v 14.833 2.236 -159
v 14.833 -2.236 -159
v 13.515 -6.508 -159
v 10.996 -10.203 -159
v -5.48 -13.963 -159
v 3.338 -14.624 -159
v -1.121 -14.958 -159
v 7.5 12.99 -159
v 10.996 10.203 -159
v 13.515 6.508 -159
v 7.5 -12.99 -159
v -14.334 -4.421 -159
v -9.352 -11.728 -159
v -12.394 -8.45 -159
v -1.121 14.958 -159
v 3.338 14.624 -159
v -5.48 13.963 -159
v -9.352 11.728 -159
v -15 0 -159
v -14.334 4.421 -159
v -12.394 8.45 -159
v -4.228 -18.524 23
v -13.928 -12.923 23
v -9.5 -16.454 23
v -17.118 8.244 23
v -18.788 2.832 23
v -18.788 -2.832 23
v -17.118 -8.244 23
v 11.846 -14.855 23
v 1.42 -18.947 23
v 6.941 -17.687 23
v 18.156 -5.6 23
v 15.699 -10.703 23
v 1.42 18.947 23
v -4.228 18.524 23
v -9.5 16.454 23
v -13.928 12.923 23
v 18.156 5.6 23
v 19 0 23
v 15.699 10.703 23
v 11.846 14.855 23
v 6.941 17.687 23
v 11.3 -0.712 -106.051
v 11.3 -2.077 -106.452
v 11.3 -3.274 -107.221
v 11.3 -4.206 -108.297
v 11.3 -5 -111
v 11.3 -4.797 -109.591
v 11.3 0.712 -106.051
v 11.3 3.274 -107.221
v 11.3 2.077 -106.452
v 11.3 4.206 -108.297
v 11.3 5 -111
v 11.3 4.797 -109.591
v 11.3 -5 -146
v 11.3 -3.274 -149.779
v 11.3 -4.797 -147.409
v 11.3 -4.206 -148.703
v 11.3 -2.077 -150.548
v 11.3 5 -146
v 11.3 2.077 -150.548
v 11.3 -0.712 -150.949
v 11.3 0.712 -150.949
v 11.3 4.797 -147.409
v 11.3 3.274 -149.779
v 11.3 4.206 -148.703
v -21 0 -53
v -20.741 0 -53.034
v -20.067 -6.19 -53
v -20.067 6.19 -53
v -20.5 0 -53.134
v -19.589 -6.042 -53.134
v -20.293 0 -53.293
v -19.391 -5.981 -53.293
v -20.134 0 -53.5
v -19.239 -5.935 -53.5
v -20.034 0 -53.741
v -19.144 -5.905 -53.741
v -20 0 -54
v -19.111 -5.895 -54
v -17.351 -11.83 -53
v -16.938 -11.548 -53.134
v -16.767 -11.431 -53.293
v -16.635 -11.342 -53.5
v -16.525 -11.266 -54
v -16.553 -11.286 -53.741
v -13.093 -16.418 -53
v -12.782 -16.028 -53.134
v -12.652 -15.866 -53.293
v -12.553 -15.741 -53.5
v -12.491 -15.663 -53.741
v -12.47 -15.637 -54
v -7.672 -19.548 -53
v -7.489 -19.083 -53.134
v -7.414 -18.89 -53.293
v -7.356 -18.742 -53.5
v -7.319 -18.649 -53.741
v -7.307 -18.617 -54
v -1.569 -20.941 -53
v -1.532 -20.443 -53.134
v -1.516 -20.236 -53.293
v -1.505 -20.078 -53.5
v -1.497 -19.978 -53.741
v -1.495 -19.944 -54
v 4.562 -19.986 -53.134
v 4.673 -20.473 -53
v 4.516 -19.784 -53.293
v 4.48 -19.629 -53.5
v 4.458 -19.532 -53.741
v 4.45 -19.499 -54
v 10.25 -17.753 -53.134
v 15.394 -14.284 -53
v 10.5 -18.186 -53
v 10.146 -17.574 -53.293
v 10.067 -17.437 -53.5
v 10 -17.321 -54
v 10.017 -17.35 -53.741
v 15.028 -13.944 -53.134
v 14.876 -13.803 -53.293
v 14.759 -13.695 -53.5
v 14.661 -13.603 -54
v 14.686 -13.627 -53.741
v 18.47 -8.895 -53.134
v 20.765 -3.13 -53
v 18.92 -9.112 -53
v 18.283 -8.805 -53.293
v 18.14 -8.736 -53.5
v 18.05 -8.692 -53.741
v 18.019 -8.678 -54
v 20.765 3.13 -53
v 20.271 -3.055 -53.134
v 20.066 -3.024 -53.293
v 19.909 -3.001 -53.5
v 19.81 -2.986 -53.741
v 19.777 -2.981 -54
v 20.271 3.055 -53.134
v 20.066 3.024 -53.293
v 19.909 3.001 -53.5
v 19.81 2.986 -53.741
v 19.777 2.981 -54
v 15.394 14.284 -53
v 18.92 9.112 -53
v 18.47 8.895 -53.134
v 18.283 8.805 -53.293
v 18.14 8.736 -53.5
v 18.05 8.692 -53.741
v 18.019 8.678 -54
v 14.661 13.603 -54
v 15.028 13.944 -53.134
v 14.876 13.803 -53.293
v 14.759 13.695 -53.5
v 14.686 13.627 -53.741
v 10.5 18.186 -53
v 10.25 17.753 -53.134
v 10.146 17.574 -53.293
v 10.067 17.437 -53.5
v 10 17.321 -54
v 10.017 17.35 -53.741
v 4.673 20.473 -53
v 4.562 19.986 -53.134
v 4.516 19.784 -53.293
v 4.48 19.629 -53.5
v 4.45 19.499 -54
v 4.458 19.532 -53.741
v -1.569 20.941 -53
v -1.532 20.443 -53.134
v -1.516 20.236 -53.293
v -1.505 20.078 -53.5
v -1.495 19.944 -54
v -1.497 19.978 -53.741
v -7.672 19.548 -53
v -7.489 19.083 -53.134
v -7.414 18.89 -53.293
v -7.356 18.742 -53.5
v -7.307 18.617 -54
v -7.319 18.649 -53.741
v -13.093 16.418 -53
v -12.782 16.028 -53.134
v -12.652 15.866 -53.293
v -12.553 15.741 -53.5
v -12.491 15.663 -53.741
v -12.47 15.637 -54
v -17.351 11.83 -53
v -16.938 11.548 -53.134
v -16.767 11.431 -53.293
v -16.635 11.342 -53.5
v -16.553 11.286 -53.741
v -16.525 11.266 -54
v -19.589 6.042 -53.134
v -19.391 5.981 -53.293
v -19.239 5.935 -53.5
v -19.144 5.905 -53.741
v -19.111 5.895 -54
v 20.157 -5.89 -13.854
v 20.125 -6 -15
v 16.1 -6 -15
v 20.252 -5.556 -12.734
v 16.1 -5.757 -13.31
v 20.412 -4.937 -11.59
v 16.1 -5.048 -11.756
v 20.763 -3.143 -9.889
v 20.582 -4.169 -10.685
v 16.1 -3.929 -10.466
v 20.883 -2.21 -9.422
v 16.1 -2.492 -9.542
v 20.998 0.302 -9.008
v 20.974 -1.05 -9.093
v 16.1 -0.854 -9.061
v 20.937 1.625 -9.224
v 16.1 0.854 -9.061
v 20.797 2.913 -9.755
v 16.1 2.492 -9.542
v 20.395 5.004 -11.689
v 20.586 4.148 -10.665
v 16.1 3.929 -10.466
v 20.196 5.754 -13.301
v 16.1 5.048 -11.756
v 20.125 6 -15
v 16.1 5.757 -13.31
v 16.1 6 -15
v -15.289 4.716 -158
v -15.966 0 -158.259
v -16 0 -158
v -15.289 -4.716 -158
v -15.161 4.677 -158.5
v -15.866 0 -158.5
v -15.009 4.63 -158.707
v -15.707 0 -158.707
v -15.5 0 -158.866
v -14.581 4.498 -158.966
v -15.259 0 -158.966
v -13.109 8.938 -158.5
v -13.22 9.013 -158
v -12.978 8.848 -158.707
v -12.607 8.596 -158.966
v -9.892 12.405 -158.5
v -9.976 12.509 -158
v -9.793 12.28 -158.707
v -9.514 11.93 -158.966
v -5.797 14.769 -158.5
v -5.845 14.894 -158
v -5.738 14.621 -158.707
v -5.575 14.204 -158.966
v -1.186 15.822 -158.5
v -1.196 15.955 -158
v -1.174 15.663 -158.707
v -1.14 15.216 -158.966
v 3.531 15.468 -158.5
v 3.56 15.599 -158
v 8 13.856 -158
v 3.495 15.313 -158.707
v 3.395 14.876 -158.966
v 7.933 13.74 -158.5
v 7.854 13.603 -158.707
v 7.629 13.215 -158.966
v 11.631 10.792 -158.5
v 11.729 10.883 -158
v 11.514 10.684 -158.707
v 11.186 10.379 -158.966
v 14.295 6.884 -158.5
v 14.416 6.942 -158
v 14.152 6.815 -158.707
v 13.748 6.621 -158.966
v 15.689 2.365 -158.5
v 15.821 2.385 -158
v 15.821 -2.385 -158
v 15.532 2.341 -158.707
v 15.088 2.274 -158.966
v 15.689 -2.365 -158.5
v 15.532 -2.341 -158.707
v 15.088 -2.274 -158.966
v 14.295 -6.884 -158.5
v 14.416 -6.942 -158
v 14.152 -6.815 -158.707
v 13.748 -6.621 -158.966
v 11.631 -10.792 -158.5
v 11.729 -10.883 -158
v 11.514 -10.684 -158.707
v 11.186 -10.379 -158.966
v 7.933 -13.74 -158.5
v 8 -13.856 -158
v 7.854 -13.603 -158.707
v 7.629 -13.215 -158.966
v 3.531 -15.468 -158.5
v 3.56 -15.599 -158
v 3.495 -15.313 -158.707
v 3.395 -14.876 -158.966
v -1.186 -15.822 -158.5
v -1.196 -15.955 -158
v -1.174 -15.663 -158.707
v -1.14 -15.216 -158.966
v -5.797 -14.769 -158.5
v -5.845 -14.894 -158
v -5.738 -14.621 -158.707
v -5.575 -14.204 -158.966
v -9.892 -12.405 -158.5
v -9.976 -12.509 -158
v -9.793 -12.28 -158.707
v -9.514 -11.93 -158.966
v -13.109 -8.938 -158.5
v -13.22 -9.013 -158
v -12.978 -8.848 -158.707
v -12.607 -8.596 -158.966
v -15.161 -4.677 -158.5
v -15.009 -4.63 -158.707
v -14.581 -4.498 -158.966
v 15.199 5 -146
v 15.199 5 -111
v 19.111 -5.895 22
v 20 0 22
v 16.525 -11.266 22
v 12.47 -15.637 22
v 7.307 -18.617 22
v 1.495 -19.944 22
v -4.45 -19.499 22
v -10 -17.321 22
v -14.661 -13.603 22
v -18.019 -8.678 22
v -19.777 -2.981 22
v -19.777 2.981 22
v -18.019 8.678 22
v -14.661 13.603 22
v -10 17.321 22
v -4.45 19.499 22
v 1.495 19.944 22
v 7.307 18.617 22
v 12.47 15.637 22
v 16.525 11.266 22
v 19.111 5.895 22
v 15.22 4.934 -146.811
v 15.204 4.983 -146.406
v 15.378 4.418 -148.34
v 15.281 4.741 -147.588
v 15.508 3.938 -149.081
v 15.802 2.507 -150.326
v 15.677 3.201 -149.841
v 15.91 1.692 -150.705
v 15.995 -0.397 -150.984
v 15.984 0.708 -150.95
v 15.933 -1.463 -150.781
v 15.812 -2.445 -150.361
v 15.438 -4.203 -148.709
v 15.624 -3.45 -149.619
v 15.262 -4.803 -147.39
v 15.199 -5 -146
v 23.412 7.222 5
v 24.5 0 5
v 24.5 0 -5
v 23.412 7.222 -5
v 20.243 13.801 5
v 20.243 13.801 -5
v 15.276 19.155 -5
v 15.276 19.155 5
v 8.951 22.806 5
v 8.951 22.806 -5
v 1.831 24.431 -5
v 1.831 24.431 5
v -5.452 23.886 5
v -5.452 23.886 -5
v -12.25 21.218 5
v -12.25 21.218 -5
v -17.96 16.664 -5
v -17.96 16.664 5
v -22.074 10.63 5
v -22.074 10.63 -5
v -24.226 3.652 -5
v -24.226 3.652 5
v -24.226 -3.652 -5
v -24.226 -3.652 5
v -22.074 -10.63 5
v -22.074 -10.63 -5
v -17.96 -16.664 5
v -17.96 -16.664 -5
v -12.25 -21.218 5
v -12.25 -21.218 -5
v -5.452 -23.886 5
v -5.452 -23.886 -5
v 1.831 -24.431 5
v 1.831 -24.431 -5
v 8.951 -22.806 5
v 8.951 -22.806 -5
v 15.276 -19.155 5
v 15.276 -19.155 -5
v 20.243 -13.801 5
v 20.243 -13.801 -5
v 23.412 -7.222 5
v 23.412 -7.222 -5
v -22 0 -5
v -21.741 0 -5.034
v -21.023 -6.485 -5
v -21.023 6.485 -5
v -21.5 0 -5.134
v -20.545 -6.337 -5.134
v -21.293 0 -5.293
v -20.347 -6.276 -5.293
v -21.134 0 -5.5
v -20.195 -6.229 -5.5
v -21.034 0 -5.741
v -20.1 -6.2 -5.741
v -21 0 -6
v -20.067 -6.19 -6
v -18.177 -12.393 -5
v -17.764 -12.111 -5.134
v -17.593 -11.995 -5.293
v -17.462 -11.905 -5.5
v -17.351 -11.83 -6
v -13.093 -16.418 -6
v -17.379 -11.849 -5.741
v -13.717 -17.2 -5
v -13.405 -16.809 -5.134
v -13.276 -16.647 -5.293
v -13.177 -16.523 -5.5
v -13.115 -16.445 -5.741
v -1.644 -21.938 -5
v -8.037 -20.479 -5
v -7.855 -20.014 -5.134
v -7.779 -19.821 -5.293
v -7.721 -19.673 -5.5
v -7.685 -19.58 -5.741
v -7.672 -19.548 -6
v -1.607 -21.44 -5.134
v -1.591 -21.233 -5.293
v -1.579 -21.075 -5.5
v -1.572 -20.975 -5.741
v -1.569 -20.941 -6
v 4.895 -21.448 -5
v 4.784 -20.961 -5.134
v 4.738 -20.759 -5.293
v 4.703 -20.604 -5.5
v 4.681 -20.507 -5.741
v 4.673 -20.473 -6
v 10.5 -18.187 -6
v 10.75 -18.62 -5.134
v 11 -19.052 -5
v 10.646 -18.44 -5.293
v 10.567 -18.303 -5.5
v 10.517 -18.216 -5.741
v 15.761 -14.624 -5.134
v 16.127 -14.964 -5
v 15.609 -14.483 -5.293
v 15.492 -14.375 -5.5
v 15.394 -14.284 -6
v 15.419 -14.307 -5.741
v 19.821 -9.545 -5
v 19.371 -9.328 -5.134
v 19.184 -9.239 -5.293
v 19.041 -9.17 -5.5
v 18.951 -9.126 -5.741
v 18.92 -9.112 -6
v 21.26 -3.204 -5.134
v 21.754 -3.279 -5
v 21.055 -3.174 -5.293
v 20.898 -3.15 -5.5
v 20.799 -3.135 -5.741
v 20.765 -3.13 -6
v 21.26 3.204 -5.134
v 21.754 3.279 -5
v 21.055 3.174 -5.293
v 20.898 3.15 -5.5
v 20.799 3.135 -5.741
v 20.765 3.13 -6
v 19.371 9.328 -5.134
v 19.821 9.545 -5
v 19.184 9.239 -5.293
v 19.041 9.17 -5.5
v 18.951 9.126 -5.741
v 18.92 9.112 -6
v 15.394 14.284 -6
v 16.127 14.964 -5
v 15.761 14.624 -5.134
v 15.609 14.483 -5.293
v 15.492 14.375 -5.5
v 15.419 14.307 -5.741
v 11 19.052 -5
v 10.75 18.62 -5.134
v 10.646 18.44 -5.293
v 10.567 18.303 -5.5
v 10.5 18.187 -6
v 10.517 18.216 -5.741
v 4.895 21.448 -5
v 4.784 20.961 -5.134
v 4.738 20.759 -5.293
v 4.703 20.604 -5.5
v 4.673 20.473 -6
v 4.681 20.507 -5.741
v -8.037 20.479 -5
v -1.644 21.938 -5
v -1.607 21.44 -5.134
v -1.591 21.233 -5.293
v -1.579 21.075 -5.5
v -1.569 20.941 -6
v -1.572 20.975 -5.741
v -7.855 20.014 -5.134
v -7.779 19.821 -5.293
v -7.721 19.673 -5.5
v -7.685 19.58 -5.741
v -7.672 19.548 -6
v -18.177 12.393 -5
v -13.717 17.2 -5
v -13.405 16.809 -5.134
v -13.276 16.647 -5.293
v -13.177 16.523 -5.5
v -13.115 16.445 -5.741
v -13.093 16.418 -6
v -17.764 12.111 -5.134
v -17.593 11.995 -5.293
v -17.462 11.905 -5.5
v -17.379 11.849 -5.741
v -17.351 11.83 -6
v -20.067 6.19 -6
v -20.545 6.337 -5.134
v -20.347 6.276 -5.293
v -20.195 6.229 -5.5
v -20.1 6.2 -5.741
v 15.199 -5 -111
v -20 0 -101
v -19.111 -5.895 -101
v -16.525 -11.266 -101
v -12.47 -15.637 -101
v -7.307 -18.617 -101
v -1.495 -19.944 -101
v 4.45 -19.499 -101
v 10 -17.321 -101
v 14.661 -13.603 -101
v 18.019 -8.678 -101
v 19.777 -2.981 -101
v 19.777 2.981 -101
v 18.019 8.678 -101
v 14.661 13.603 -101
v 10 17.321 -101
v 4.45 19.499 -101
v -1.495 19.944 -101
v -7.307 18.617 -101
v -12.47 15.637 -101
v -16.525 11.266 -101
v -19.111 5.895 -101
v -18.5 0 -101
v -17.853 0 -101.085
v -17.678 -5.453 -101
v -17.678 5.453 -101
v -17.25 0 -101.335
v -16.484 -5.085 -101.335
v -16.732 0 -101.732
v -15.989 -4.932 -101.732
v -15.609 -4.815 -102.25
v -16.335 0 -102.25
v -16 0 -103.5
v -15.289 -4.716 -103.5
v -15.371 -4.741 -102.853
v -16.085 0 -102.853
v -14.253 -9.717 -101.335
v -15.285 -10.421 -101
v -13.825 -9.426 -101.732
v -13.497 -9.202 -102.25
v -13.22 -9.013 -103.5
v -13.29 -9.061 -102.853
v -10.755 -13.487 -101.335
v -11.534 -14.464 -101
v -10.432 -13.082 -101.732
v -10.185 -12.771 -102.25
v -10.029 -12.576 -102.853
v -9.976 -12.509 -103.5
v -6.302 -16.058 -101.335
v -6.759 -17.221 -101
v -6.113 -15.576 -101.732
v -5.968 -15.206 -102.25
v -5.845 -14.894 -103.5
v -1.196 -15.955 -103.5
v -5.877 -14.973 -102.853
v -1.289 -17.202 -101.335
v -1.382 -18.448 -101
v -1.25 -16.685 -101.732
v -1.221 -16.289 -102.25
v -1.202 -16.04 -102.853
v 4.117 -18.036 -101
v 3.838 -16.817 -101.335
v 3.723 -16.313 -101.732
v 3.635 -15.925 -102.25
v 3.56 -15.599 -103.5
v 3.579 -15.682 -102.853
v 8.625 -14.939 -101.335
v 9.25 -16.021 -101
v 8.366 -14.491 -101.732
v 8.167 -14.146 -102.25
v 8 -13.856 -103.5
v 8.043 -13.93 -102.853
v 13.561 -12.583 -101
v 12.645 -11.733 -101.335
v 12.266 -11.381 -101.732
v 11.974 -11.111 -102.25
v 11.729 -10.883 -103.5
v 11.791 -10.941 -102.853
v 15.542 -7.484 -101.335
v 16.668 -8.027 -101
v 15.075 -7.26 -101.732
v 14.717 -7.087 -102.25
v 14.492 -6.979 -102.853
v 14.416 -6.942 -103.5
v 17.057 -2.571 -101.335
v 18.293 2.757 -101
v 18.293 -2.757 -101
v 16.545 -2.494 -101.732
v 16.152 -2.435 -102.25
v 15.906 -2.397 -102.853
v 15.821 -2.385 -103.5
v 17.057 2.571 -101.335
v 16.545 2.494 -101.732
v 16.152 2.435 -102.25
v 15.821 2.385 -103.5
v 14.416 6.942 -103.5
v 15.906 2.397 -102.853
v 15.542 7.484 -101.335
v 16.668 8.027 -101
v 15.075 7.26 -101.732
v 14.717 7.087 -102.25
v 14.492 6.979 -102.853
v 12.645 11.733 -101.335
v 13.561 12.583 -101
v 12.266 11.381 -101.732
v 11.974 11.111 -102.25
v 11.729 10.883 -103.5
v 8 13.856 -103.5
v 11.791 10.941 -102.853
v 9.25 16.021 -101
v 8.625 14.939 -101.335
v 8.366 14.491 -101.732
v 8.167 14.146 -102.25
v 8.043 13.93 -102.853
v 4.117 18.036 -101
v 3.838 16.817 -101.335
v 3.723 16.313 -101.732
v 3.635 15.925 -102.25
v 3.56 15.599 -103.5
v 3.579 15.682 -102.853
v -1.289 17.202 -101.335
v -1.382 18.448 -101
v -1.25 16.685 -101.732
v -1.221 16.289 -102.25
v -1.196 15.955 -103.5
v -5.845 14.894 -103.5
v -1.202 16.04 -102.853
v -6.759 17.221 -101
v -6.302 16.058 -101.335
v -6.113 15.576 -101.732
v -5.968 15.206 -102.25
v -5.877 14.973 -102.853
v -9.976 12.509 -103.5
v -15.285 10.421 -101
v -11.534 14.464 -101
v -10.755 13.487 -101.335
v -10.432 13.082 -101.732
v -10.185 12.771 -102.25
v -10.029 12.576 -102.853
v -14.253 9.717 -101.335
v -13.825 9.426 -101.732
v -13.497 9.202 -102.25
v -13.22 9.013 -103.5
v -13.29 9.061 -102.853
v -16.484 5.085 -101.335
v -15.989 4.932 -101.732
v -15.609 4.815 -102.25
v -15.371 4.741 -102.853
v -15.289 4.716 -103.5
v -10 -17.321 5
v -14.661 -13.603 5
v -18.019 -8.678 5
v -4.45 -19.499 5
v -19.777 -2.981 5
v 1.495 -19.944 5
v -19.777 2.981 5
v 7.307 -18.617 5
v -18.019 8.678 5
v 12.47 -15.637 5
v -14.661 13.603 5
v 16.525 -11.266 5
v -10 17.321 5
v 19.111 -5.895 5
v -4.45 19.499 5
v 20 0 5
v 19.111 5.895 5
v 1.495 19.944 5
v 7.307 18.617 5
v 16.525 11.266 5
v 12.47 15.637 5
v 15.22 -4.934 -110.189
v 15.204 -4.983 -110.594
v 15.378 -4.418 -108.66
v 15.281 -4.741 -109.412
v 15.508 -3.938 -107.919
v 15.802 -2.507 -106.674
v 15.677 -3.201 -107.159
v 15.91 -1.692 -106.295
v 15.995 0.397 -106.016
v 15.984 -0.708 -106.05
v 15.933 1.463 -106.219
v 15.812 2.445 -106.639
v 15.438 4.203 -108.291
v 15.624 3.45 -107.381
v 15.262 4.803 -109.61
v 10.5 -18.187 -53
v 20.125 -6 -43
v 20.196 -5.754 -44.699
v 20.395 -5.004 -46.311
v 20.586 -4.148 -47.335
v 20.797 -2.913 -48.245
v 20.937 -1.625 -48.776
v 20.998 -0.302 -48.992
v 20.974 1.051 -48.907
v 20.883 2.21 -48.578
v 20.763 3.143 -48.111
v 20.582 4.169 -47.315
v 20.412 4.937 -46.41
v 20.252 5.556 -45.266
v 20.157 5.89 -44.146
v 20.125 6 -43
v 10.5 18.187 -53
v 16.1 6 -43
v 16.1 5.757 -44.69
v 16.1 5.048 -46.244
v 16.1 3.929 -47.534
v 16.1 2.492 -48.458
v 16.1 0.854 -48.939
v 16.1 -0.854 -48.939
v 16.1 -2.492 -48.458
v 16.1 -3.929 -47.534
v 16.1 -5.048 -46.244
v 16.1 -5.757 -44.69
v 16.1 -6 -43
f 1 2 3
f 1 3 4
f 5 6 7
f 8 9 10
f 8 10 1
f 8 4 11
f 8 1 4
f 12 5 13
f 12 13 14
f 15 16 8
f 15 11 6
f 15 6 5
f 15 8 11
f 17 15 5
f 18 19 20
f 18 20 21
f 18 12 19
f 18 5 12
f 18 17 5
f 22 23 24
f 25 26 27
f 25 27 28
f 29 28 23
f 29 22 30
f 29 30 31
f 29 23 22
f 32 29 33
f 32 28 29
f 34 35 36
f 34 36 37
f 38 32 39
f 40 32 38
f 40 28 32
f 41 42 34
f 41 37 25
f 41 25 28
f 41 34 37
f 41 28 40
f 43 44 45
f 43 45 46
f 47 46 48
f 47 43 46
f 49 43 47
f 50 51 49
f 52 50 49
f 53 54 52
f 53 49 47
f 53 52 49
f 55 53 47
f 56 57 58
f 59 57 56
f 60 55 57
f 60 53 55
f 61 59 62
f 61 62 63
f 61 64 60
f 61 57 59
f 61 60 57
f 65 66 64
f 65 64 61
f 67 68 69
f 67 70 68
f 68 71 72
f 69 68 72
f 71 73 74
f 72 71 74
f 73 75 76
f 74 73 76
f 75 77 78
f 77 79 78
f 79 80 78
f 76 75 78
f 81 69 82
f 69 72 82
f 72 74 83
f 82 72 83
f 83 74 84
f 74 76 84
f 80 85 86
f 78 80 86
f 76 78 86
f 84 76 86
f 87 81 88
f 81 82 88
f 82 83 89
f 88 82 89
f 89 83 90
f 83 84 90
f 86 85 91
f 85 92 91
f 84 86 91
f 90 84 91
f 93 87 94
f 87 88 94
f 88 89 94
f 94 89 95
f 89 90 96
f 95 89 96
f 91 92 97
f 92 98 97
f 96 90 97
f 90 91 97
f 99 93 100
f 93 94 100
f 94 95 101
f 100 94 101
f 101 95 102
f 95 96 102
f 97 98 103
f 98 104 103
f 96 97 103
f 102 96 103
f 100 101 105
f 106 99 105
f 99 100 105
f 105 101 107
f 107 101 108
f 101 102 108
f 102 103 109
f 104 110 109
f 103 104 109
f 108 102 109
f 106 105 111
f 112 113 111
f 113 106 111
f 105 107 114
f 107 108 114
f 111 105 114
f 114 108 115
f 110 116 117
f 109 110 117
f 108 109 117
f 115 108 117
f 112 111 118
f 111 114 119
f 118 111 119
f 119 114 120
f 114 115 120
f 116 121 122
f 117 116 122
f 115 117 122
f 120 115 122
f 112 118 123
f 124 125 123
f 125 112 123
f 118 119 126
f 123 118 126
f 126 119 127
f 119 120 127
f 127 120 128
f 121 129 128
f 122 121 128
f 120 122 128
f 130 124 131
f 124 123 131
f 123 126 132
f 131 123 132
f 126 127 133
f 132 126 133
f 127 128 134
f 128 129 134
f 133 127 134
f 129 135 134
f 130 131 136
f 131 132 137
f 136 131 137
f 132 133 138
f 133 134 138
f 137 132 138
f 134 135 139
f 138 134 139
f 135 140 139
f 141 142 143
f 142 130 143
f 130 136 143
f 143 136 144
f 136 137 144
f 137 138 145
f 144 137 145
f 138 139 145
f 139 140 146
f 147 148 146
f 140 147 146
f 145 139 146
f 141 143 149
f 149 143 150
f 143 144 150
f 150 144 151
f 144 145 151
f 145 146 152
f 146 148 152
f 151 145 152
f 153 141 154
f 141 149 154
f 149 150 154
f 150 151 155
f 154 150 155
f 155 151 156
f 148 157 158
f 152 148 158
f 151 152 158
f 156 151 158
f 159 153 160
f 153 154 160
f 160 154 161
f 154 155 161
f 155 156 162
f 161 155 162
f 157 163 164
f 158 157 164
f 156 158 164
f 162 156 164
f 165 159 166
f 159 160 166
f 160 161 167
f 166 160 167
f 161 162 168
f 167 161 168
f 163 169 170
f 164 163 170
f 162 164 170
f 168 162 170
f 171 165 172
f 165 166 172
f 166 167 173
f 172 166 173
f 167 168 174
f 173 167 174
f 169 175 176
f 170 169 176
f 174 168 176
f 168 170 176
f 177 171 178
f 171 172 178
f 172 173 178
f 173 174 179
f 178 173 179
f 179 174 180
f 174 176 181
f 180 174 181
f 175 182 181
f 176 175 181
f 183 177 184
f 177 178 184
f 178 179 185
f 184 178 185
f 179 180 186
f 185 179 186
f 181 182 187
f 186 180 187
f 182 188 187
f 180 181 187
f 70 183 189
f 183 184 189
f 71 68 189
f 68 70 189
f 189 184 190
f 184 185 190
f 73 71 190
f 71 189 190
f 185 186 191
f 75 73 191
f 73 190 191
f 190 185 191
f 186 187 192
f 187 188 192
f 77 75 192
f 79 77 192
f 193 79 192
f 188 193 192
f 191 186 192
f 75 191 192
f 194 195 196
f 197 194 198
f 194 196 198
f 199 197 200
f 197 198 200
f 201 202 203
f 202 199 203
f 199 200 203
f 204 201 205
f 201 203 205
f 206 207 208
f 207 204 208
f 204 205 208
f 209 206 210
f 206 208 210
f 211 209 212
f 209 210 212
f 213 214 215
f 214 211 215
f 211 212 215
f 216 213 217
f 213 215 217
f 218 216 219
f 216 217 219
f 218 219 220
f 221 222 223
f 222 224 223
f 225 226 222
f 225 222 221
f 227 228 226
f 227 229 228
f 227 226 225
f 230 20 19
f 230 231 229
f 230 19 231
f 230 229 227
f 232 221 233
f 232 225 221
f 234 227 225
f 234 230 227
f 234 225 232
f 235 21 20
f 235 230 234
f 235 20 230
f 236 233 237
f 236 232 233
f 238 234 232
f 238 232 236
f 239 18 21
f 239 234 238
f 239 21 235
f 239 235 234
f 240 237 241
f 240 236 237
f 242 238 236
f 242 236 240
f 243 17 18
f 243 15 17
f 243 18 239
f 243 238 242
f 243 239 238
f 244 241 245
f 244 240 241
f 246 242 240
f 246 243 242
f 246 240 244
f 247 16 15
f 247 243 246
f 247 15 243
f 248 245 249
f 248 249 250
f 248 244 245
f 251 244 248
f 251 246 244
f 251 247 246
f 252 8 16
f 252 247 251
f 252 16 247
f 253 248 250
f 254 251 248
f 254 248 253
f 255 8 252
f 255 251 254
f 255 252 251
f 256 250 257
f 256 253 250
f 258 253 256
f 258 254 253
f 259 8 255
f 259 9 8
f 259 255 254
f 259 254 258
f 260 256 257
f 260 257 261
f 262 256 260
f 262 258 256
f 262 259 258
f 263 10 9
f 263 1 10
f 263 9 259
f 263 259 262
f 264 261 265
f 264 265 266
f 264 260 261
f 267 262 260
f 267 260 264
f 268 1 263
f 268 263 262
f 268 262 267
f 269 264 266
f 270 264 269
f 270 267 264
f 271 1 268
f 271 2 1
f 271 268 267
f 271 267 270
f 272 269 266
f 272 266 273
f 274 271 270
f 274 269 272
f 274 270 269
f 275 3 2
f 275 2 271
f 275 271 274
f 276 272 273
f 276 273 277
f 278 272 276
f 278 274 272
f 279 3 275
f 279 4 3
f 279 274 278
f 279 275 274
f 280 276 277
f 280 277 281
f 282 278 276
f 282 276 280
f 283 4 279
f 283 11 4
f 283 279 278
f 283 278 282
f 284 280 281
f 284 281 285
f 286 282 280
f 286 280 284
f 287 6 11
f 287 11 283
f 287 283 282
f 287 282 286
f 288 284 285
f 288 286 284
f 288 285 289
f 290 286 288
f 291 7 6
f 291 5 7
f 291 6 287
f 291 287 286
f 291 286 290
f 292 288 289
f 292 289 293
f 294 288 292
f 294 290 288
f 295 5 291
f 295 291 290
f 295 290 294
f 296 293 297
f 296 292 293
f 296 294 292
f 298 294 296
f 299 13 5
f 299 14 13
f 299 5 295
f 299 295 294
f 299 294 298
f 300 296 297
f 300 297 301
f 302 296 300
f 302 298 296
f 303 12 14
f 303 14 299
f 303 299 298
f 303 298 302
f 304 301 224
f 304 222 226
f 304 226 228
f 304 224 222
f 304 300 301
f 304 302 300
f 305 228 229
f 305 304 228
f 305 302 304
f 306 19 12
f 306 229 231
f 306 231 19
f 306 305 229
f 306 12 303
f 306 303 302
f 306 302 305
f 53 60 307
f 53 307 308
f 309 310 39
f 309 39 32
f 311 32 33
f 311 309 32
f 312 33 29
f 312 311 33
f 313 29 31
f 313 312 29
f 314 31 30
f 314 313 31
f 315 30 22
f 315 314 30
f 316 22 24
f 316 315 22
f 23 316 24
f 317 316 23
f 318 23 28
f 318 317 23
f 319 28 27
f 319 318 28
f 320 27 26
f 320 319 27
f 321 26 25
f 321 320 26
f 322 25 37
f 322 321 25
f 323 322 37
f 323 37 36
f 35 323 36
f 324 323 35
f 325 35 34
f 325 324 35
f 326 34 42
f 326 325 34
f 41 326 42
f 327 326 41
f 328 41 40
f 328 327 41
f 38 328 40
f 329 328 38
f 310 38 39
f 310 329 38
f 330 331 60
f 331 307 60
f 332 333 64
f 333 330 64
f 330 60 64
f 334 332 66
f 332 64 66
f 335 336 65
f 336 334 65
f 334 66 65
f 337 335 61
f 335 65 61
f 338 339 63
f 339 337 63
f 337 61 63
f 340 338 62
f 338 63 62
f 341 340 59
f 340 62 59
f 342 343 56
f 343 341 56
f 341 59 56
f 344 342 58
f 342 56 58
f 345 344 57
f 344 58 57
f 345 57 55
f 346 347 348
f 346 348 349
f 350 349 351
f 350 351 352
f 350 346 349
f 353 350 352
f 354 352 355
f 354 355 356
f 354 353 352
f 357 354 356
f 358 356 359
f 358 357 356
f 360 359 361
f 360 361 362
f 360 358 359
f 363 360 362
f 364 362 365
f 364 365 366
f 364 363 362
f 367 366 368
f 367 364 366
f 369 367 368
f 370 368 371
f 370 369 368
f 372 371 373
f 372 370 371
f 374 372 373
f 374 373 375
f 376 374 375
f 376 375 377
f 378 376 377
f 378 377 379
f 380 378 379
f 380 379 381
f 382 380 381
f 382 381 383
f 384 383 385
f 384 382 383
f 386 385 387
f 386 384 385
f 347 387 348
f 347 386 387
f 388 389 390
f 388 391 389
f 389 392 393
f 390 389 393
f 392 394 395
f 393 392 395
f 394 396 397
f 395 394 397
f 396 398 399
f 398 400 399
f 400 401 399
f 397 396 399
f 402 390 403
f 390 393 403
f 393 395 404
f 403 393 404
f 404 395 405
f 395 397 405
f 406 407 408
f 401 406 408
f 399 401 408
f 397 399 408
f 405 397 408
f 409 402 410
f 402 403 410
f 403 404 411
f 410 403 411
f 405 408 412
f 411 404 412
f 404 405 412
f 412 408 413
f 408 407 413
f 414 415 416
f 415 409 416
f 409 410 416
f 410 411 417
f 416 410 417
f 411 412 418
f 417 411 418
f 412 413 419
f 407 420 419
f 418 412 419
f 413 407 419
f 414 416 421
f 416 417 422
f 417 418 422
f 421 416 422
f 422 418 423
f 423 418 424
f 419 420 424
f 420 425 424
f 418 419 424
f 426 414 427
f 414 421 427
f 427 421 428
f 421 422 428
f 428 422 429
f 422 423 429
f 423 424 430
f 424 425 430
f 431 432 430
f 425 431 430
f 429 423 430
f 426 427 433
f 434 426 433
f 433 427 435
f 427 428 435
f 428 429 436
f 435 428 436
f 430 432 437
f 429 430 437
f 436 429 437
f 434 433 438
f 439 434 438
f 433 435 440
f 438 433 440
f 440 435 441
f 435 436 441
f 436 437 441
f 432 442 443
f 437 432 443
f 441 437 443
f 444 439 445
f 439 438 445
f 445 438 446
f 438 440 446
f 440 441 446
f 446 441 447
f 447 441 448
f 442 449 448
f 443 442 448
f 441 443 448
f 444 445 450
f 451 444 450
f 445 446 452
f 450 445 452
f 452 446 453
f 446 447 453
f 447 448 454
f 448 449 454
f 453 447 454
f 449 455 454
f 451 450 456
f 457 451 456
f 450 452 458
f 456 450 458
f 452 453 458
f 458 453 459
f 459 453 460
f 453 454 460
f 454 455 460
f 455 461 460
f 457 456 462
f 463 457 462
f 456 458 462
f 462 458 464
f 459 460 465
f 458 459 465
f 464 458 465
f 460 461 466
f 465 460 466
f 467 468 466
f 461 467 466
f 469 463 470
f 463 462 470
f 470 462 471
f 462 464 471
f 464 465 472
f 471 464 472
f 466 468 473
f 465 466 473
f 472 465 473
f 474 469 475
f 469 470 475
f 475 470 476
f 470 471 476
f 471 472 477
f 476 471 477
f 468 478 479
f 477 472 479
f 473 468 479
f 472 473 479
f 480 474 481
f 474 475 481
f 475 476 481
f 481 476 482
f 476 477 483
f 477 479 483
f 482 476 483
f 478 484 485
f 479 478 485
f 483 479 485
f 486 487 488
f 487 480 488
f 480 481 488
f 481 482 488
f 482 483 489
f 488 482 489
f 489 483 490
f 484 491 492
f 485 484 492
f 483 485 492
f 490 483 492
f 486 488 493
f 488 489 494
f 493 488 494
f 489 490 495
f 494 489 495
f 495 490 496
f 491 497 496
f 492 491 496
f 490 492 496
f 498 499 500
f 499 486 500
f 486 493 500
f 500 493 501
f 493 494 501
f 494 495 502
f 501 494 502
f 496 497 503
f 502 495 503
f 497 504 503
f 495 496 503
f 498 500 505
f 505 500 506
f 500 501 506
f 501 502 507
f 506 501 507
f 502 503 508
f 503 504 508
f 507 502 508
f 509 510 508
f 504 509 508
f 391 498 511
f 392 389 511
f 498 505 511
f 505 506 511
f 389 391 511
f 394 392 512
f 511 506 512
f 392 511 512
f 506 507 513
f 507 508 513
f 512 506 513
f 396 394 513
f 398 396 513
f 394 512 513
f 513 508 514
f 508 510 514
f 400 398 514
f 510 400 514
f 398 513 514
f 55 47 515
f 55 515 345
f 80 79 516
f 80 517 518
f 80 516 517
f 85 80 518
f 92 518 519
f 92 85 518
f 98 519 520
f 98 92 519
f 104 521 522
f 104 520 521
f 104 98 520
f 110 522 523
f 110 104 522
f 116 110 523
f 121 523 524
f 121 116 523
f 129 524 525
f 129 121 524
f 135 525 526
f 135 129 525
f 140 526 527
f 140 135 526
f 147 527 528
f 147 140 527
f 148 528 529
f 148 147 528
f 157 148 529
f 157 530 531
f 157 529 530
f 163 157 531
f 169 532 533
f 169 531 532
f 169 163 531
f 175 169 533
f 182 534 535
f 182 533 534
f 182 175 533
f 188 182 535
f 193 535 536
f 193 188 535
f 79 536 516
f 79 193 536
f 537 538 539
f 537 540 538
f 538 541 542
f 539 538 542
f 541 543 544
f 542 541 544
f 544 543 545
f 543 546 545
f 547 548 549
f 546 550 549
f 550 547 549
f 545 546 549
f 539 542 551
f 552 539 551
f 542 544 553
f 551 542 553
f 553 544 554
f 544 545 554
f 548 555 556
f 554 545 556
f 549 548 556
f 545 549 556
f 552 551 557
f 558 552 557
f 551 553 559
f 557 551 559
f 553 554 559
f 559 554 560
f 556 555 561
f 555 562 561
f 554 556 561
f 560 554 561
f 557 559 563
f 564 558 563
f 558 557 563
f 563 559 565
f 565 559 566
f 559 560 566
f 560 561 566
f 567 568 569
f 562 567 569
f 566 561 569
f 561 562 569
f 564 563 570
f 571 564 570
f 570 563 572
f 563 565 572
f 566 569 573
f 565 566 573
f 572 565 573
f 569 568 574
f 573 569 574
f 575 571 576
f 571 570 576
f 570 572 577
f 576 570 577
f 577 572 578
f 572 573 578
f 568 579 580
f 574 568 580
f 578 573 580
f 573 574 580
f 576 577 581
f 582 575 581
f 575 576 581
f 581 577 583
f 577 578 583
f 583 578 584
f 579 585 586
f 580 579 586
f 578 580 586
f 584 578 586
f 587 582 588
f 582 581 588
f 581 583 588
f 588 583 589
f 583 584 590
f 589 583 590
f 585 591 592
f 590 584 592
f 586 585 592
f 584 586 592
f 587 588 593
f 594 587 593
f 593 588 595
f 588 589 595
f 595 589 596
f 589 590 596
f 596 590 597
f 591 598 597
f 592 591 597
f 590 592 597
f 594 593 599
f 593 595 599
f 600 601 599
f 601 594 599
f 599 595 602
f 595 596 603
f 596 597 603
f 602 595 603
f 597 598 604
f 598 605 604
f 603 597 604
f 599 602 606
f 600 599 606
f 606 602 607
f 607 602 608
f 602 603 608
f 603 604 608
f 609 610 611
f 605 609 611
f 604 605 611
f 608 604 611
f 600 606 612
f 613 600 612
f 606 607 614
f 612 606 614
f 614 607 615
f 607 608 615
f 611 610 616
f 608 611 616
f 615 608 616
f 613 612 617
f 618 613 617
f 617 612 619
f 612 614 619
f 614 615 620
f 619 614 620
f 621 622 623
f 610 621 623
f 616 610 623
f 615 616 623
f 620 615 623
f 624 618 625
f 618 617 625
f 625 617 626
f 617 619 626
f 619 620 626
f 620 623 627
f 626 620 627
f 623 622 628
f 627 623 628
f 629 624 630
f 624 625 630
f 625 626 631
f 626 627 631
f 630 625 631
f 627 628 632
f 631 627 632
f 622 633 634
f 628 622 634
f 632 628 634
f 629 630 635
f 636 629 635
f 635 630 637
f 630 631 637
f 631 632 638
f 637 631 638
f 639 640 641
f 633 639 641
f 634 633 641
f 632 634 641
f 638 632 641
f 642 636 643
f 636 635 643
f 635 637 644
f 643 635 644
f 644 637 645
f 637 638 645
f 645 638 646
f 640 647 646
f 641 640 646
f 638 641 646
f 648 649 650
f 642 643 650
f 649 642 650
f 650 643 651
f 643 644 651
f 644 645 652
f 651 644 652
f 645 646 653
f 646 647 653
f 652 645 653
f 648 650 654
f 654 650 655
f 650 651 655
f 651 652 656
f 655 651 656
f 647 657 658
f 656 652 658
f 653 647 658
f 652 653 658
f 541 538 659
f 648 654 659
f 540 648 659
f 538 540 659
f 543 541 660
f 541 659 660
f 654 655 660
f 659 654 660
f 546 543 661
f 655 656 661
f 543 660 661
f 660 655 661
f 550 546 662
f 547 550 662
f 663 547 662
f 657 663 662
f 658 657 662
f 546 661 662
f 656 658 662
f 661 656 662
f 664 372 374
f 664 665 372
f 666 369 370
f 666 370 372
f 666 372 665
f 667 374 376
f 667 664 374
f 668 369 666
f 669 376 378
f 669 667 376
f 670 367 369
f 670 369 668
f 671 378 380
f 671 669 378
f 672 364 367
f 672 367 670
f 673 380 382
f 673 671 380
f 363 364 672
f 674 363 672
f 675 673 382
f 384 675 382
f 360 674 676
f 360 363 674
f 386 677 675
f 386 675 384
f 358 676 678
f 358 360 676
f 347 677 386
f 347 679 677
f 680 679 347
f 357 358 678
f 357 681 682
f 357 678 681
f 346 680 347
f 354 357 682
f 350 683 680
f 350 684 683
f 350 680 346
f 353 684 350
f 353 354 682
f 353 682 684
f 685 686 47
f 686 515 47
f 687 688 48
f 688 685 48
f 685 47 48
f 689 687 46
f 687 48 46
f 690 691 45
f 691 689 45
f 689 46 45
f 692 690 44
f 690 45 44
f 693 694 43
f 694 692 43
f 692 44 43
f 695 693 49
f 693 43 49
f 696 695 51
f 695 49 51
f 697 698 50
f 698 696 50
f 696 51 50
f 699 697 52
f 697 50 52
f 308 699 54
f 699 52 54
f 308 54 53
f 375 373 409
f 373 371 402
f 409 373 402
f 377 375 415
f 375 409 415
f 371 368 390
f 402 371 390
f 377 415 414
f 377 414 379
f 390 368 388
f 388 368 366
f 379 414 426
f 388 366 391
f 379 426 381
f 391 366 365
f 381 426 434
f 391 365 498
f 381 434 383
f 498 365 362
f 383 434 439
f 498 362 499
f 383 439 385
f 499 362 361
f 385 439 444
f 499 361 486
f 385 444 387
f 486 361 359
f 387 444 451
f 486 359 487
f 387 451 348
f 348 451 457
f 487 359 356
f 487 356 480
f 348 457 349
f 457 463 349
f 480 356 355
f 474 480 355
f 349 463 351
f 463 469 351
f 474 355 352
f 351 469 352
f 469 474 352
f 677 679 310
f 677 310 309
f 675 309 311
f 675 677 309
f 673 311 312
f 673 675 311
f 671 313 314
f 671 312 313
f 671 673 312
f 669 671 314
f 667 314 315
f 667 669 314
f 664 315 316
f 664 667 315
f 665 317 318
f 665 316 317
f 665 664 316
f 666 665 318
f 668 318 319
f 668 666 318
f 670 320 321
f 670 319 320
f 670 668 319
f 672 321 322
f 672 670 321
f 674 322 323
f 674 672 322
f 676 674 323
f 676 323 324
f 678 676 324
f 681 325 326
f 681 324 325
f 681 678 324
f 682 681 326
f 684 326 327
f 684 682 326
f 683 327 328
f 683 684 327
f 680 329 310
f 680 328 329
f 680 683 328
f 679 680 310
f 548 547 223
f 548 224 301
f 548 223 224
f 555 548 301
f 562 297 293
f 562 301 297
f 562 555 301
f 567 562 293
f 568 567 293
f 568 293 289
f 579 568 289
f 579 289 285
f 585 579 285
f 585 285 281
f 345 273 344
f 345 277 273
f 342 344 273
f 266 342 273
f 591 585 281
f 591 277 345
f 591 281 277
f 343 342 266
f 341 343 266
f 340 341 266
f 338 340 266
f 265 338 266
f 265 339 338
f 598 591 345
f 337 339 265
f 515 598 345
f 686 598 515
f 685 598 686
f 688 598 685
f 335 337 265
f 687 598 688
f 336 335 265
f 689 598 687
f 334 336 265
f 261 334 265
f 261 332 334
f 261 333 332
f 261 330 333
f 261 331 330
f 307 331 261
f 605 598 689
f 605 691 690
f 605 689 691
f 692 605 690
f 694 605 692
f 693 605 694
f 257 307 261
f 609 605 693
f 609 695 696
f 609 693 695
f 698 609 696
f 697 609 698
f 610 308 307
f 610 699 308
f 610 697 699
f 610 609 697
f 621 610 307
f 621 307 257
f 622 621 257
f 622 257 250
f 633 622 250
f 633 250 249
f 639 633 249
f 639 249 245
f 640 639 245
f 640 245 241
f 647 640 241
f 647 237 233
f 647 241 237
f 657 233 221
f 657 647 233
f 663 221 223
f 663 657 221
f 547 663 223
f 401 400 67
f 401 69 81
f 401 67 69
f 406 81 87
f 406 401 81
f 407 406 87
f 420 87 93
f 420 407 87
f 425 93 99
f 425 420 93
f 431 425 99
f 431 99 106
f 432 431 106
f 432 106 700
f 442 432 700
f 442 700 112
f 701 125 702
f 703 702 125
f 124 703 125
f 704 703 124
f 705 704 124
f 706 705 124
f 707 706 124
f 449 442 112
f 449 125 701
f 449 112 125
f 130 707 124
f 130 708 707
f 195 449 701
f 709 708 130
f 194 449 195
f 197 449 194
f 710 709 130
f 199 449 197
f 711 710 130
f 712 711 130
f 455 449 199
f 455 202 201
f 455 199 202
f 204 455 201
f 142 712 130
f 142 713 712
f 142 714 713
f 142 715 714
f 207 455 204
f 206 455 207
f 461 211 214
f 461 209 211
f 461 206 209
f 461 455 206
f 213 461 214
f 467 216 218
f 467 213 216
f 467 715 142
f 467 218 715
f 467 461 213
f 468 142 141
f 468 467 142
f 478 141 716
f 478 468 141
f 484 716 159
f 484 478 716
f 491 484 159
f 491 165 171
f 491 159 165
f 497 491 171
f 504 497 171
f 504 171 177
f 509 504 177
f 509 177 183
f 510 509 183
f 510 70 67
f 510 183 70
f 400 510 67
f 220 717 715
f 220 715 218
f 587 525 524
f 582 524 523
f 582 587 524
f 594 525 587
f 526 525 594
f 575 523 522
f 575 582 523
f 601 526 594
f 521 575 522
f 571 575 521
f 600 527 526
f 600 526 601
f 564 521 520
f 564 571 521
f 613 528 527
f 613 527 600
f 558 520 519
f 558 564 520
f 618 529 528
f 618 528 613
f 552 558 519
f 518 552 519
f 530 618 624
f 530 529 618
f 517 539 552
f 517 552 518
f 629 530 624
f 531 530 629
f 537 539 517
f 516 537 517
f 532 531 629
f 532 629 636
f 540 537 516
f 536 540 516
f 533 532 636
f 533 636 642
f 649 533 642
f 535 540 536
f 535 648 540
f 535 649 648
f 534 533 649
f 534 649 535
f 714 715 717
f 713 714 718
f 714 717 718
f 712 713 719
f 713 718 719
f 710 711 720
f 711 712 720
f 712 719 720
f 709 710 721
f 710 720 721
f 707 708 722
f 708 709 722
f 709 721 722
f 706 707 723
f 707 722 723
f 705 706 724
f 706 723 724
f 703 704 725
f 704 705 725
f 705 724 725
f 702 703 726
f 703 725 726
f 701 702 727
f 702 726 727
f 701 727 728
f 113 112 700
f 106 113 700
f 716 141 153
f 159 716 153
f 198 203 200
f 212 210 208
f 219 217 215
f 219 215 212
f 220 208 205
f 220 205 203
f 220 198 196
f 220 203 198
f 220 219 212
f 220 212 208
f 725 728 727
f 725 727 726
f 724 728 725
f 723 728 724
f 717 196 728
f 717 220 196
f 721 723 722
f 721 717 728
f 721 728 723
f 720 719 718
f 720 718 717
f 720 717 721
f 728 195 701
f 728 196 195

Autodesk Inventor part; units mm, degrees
ref_plane "YZ Plane" through (0, 0, 0) normal (1, 0, 0) x (0, 1, 0)
ref_plane "XZ Plane" through (0, 0, 0) normal (0, 1, 0) x (-1, 0, 0)
ref_plane "XY Plane" through (0, 0, 0) normal (0, 0, 1) x (1, 0, 0)
sketch "Náčrt1" plane through (0, 0, 0) normal (0, 0, 1) x (1, 0, 0)
  circle A0 centre (0, 0) radius 24.5
  dimension "d0" = 49
extrude "Vysunutí1" add sketch "Náčrt1" along normal mid plane 10
sketch "Náčrt2" plane through (0, 0, 5) normal (0, 0, 1) x (1, 0, 0)
  circle A0 centre (0, 0) radius 20
  dimension "d3" = 40
extrude "Vysunutí2" add sketch "Náčrt2" along normal blind 18
sketch "Náčrt3" plane through (0, 0, -5) normal (0, 0, -1) x (-1, 0, 0)
  circle A0 centre (0, 0) radius 21
  dimension "d6" = 42
extrude "Vysunutí3" add sketch "Náčrt3" along normal blind 48
sketch "Náčrt4" plane through (0, 0, -53) normal (0, 0, -1) x (-1, 0, 0)
  circle A0 centre (0, 0) radius 20
  dimension "d9" = 40
extrude "Vysunutí4" add sketch "Náčrt4" along normal blind 48
sketch "Náčrt5" plane through (0, 0, -101) normal (0, 0, -1) x (-1, 0, 0)
  circle A0 centre (0, 0) radius 16
  dimension "d12" = 32
extrude "Vysunutí5" add sketch "Náčrt5" along normal blind 58
sketch "Náčrt6" plane through (0, 0, 0) normal (1, 0, 0) x (0, 1, 0)
  line L0 (0, -9) -> (0, -49) construction
  line L1 (-6, -15) -> (-6, -43)
  line L2 (6, -43) -> (6, -15)
  arc A0 (6, -15) -> (-6, -15) centre (0, -15) ccw
  arc A1 (-6, -43) -> (6, -43) centre (0, -43) ccw
  line L3 (-24.5, -5) -> (24.5, -5) projected
  line L4 (0, -195.4) -> (0, 59.4) projected
  line L5 (-21, -53) -> (21, -53) projected
  point P0 (0, 0)
  point P1 (0, -29)
  dimension "d15" = 12
  dimension "d16" = 4
  dimension "d17" = 4
extrude "Vysunutí6" cut sketch "Náčrt6" along normal through all
sketch "Náčrt7" plane through (0, 0, 0) normal (1, 0, 0) x (0, 0, -1)
  line L0 (15, -6) -> (43, -6) projected
  arc A0 (43, -6) -> (43, 6) centre (43, 0) ccw projected
  line L1 (43, 6) -> (15, 6) projected
  arc A1 (15, 6) -> (15, -6) centre (15, 0) ccw projected
  point P0 (0, 0)
extrude "Vysunutí7" add sketch "Náčrt7" along normal blind 16.1 and the other way blind 18.55
sketch "Náčrt8" plane through (0, 0, 0) normal (1, 0, 0) x (0, 1, 0)
  line L0 (0, -195.4) -> (0, 59.4) projected
  line L1 (0, -106) -> (0, -151) construction
  line L2 (-5, -111) -> (-5, -146)
  line L3 (5, -146) -> (5, -111)
  arc A0 (5, -111) -> (-5, -111) centre (0, -111) ccw
  arc A1 (-5, -146) -> (5, -146) centre (0, -146) ccw
  line L4 (-20, -101) -> (20, -101) projected
  point P0 (0, 0)
  point P1 (0, -128.5)
  dimension "d24" = 10
  dimension "d25" = 5
  dimension "d26" = 35
extrude "Vysunutí8" cut sketch "Náčrt8" along normal through all
sketch "Náčrt9" plane through (0, 0, 0) normal (1, 0, 0) x (0, 0, -1)
  line L0 (111, -5) -> (146, -5) projected
  arc A0 (146, -5) -> (146, 5) centre (146, 0) ccw projected
  line L1 (146, 5) -> (111, 5) projected
  arc A1 (111, 5) -> (111, -5) centre (111, 0) ccw projected
  point P0 (0, 0)
extrude "Vysunutí9" add sketch "Náčrt9" along normal blind 11.3
chamfer "Zkosení1" distance 1 angle 45 1 edges at (-20, 0, 23)
fillet "Zaoblení2" radius 1 3 edges at (21, 0, -5) (20, 0, -53) (16, 0, -159)
fillet "Zaoblení2" radius 2.5 1 edges at (16, 0, -101)
properties part number "hridel"
